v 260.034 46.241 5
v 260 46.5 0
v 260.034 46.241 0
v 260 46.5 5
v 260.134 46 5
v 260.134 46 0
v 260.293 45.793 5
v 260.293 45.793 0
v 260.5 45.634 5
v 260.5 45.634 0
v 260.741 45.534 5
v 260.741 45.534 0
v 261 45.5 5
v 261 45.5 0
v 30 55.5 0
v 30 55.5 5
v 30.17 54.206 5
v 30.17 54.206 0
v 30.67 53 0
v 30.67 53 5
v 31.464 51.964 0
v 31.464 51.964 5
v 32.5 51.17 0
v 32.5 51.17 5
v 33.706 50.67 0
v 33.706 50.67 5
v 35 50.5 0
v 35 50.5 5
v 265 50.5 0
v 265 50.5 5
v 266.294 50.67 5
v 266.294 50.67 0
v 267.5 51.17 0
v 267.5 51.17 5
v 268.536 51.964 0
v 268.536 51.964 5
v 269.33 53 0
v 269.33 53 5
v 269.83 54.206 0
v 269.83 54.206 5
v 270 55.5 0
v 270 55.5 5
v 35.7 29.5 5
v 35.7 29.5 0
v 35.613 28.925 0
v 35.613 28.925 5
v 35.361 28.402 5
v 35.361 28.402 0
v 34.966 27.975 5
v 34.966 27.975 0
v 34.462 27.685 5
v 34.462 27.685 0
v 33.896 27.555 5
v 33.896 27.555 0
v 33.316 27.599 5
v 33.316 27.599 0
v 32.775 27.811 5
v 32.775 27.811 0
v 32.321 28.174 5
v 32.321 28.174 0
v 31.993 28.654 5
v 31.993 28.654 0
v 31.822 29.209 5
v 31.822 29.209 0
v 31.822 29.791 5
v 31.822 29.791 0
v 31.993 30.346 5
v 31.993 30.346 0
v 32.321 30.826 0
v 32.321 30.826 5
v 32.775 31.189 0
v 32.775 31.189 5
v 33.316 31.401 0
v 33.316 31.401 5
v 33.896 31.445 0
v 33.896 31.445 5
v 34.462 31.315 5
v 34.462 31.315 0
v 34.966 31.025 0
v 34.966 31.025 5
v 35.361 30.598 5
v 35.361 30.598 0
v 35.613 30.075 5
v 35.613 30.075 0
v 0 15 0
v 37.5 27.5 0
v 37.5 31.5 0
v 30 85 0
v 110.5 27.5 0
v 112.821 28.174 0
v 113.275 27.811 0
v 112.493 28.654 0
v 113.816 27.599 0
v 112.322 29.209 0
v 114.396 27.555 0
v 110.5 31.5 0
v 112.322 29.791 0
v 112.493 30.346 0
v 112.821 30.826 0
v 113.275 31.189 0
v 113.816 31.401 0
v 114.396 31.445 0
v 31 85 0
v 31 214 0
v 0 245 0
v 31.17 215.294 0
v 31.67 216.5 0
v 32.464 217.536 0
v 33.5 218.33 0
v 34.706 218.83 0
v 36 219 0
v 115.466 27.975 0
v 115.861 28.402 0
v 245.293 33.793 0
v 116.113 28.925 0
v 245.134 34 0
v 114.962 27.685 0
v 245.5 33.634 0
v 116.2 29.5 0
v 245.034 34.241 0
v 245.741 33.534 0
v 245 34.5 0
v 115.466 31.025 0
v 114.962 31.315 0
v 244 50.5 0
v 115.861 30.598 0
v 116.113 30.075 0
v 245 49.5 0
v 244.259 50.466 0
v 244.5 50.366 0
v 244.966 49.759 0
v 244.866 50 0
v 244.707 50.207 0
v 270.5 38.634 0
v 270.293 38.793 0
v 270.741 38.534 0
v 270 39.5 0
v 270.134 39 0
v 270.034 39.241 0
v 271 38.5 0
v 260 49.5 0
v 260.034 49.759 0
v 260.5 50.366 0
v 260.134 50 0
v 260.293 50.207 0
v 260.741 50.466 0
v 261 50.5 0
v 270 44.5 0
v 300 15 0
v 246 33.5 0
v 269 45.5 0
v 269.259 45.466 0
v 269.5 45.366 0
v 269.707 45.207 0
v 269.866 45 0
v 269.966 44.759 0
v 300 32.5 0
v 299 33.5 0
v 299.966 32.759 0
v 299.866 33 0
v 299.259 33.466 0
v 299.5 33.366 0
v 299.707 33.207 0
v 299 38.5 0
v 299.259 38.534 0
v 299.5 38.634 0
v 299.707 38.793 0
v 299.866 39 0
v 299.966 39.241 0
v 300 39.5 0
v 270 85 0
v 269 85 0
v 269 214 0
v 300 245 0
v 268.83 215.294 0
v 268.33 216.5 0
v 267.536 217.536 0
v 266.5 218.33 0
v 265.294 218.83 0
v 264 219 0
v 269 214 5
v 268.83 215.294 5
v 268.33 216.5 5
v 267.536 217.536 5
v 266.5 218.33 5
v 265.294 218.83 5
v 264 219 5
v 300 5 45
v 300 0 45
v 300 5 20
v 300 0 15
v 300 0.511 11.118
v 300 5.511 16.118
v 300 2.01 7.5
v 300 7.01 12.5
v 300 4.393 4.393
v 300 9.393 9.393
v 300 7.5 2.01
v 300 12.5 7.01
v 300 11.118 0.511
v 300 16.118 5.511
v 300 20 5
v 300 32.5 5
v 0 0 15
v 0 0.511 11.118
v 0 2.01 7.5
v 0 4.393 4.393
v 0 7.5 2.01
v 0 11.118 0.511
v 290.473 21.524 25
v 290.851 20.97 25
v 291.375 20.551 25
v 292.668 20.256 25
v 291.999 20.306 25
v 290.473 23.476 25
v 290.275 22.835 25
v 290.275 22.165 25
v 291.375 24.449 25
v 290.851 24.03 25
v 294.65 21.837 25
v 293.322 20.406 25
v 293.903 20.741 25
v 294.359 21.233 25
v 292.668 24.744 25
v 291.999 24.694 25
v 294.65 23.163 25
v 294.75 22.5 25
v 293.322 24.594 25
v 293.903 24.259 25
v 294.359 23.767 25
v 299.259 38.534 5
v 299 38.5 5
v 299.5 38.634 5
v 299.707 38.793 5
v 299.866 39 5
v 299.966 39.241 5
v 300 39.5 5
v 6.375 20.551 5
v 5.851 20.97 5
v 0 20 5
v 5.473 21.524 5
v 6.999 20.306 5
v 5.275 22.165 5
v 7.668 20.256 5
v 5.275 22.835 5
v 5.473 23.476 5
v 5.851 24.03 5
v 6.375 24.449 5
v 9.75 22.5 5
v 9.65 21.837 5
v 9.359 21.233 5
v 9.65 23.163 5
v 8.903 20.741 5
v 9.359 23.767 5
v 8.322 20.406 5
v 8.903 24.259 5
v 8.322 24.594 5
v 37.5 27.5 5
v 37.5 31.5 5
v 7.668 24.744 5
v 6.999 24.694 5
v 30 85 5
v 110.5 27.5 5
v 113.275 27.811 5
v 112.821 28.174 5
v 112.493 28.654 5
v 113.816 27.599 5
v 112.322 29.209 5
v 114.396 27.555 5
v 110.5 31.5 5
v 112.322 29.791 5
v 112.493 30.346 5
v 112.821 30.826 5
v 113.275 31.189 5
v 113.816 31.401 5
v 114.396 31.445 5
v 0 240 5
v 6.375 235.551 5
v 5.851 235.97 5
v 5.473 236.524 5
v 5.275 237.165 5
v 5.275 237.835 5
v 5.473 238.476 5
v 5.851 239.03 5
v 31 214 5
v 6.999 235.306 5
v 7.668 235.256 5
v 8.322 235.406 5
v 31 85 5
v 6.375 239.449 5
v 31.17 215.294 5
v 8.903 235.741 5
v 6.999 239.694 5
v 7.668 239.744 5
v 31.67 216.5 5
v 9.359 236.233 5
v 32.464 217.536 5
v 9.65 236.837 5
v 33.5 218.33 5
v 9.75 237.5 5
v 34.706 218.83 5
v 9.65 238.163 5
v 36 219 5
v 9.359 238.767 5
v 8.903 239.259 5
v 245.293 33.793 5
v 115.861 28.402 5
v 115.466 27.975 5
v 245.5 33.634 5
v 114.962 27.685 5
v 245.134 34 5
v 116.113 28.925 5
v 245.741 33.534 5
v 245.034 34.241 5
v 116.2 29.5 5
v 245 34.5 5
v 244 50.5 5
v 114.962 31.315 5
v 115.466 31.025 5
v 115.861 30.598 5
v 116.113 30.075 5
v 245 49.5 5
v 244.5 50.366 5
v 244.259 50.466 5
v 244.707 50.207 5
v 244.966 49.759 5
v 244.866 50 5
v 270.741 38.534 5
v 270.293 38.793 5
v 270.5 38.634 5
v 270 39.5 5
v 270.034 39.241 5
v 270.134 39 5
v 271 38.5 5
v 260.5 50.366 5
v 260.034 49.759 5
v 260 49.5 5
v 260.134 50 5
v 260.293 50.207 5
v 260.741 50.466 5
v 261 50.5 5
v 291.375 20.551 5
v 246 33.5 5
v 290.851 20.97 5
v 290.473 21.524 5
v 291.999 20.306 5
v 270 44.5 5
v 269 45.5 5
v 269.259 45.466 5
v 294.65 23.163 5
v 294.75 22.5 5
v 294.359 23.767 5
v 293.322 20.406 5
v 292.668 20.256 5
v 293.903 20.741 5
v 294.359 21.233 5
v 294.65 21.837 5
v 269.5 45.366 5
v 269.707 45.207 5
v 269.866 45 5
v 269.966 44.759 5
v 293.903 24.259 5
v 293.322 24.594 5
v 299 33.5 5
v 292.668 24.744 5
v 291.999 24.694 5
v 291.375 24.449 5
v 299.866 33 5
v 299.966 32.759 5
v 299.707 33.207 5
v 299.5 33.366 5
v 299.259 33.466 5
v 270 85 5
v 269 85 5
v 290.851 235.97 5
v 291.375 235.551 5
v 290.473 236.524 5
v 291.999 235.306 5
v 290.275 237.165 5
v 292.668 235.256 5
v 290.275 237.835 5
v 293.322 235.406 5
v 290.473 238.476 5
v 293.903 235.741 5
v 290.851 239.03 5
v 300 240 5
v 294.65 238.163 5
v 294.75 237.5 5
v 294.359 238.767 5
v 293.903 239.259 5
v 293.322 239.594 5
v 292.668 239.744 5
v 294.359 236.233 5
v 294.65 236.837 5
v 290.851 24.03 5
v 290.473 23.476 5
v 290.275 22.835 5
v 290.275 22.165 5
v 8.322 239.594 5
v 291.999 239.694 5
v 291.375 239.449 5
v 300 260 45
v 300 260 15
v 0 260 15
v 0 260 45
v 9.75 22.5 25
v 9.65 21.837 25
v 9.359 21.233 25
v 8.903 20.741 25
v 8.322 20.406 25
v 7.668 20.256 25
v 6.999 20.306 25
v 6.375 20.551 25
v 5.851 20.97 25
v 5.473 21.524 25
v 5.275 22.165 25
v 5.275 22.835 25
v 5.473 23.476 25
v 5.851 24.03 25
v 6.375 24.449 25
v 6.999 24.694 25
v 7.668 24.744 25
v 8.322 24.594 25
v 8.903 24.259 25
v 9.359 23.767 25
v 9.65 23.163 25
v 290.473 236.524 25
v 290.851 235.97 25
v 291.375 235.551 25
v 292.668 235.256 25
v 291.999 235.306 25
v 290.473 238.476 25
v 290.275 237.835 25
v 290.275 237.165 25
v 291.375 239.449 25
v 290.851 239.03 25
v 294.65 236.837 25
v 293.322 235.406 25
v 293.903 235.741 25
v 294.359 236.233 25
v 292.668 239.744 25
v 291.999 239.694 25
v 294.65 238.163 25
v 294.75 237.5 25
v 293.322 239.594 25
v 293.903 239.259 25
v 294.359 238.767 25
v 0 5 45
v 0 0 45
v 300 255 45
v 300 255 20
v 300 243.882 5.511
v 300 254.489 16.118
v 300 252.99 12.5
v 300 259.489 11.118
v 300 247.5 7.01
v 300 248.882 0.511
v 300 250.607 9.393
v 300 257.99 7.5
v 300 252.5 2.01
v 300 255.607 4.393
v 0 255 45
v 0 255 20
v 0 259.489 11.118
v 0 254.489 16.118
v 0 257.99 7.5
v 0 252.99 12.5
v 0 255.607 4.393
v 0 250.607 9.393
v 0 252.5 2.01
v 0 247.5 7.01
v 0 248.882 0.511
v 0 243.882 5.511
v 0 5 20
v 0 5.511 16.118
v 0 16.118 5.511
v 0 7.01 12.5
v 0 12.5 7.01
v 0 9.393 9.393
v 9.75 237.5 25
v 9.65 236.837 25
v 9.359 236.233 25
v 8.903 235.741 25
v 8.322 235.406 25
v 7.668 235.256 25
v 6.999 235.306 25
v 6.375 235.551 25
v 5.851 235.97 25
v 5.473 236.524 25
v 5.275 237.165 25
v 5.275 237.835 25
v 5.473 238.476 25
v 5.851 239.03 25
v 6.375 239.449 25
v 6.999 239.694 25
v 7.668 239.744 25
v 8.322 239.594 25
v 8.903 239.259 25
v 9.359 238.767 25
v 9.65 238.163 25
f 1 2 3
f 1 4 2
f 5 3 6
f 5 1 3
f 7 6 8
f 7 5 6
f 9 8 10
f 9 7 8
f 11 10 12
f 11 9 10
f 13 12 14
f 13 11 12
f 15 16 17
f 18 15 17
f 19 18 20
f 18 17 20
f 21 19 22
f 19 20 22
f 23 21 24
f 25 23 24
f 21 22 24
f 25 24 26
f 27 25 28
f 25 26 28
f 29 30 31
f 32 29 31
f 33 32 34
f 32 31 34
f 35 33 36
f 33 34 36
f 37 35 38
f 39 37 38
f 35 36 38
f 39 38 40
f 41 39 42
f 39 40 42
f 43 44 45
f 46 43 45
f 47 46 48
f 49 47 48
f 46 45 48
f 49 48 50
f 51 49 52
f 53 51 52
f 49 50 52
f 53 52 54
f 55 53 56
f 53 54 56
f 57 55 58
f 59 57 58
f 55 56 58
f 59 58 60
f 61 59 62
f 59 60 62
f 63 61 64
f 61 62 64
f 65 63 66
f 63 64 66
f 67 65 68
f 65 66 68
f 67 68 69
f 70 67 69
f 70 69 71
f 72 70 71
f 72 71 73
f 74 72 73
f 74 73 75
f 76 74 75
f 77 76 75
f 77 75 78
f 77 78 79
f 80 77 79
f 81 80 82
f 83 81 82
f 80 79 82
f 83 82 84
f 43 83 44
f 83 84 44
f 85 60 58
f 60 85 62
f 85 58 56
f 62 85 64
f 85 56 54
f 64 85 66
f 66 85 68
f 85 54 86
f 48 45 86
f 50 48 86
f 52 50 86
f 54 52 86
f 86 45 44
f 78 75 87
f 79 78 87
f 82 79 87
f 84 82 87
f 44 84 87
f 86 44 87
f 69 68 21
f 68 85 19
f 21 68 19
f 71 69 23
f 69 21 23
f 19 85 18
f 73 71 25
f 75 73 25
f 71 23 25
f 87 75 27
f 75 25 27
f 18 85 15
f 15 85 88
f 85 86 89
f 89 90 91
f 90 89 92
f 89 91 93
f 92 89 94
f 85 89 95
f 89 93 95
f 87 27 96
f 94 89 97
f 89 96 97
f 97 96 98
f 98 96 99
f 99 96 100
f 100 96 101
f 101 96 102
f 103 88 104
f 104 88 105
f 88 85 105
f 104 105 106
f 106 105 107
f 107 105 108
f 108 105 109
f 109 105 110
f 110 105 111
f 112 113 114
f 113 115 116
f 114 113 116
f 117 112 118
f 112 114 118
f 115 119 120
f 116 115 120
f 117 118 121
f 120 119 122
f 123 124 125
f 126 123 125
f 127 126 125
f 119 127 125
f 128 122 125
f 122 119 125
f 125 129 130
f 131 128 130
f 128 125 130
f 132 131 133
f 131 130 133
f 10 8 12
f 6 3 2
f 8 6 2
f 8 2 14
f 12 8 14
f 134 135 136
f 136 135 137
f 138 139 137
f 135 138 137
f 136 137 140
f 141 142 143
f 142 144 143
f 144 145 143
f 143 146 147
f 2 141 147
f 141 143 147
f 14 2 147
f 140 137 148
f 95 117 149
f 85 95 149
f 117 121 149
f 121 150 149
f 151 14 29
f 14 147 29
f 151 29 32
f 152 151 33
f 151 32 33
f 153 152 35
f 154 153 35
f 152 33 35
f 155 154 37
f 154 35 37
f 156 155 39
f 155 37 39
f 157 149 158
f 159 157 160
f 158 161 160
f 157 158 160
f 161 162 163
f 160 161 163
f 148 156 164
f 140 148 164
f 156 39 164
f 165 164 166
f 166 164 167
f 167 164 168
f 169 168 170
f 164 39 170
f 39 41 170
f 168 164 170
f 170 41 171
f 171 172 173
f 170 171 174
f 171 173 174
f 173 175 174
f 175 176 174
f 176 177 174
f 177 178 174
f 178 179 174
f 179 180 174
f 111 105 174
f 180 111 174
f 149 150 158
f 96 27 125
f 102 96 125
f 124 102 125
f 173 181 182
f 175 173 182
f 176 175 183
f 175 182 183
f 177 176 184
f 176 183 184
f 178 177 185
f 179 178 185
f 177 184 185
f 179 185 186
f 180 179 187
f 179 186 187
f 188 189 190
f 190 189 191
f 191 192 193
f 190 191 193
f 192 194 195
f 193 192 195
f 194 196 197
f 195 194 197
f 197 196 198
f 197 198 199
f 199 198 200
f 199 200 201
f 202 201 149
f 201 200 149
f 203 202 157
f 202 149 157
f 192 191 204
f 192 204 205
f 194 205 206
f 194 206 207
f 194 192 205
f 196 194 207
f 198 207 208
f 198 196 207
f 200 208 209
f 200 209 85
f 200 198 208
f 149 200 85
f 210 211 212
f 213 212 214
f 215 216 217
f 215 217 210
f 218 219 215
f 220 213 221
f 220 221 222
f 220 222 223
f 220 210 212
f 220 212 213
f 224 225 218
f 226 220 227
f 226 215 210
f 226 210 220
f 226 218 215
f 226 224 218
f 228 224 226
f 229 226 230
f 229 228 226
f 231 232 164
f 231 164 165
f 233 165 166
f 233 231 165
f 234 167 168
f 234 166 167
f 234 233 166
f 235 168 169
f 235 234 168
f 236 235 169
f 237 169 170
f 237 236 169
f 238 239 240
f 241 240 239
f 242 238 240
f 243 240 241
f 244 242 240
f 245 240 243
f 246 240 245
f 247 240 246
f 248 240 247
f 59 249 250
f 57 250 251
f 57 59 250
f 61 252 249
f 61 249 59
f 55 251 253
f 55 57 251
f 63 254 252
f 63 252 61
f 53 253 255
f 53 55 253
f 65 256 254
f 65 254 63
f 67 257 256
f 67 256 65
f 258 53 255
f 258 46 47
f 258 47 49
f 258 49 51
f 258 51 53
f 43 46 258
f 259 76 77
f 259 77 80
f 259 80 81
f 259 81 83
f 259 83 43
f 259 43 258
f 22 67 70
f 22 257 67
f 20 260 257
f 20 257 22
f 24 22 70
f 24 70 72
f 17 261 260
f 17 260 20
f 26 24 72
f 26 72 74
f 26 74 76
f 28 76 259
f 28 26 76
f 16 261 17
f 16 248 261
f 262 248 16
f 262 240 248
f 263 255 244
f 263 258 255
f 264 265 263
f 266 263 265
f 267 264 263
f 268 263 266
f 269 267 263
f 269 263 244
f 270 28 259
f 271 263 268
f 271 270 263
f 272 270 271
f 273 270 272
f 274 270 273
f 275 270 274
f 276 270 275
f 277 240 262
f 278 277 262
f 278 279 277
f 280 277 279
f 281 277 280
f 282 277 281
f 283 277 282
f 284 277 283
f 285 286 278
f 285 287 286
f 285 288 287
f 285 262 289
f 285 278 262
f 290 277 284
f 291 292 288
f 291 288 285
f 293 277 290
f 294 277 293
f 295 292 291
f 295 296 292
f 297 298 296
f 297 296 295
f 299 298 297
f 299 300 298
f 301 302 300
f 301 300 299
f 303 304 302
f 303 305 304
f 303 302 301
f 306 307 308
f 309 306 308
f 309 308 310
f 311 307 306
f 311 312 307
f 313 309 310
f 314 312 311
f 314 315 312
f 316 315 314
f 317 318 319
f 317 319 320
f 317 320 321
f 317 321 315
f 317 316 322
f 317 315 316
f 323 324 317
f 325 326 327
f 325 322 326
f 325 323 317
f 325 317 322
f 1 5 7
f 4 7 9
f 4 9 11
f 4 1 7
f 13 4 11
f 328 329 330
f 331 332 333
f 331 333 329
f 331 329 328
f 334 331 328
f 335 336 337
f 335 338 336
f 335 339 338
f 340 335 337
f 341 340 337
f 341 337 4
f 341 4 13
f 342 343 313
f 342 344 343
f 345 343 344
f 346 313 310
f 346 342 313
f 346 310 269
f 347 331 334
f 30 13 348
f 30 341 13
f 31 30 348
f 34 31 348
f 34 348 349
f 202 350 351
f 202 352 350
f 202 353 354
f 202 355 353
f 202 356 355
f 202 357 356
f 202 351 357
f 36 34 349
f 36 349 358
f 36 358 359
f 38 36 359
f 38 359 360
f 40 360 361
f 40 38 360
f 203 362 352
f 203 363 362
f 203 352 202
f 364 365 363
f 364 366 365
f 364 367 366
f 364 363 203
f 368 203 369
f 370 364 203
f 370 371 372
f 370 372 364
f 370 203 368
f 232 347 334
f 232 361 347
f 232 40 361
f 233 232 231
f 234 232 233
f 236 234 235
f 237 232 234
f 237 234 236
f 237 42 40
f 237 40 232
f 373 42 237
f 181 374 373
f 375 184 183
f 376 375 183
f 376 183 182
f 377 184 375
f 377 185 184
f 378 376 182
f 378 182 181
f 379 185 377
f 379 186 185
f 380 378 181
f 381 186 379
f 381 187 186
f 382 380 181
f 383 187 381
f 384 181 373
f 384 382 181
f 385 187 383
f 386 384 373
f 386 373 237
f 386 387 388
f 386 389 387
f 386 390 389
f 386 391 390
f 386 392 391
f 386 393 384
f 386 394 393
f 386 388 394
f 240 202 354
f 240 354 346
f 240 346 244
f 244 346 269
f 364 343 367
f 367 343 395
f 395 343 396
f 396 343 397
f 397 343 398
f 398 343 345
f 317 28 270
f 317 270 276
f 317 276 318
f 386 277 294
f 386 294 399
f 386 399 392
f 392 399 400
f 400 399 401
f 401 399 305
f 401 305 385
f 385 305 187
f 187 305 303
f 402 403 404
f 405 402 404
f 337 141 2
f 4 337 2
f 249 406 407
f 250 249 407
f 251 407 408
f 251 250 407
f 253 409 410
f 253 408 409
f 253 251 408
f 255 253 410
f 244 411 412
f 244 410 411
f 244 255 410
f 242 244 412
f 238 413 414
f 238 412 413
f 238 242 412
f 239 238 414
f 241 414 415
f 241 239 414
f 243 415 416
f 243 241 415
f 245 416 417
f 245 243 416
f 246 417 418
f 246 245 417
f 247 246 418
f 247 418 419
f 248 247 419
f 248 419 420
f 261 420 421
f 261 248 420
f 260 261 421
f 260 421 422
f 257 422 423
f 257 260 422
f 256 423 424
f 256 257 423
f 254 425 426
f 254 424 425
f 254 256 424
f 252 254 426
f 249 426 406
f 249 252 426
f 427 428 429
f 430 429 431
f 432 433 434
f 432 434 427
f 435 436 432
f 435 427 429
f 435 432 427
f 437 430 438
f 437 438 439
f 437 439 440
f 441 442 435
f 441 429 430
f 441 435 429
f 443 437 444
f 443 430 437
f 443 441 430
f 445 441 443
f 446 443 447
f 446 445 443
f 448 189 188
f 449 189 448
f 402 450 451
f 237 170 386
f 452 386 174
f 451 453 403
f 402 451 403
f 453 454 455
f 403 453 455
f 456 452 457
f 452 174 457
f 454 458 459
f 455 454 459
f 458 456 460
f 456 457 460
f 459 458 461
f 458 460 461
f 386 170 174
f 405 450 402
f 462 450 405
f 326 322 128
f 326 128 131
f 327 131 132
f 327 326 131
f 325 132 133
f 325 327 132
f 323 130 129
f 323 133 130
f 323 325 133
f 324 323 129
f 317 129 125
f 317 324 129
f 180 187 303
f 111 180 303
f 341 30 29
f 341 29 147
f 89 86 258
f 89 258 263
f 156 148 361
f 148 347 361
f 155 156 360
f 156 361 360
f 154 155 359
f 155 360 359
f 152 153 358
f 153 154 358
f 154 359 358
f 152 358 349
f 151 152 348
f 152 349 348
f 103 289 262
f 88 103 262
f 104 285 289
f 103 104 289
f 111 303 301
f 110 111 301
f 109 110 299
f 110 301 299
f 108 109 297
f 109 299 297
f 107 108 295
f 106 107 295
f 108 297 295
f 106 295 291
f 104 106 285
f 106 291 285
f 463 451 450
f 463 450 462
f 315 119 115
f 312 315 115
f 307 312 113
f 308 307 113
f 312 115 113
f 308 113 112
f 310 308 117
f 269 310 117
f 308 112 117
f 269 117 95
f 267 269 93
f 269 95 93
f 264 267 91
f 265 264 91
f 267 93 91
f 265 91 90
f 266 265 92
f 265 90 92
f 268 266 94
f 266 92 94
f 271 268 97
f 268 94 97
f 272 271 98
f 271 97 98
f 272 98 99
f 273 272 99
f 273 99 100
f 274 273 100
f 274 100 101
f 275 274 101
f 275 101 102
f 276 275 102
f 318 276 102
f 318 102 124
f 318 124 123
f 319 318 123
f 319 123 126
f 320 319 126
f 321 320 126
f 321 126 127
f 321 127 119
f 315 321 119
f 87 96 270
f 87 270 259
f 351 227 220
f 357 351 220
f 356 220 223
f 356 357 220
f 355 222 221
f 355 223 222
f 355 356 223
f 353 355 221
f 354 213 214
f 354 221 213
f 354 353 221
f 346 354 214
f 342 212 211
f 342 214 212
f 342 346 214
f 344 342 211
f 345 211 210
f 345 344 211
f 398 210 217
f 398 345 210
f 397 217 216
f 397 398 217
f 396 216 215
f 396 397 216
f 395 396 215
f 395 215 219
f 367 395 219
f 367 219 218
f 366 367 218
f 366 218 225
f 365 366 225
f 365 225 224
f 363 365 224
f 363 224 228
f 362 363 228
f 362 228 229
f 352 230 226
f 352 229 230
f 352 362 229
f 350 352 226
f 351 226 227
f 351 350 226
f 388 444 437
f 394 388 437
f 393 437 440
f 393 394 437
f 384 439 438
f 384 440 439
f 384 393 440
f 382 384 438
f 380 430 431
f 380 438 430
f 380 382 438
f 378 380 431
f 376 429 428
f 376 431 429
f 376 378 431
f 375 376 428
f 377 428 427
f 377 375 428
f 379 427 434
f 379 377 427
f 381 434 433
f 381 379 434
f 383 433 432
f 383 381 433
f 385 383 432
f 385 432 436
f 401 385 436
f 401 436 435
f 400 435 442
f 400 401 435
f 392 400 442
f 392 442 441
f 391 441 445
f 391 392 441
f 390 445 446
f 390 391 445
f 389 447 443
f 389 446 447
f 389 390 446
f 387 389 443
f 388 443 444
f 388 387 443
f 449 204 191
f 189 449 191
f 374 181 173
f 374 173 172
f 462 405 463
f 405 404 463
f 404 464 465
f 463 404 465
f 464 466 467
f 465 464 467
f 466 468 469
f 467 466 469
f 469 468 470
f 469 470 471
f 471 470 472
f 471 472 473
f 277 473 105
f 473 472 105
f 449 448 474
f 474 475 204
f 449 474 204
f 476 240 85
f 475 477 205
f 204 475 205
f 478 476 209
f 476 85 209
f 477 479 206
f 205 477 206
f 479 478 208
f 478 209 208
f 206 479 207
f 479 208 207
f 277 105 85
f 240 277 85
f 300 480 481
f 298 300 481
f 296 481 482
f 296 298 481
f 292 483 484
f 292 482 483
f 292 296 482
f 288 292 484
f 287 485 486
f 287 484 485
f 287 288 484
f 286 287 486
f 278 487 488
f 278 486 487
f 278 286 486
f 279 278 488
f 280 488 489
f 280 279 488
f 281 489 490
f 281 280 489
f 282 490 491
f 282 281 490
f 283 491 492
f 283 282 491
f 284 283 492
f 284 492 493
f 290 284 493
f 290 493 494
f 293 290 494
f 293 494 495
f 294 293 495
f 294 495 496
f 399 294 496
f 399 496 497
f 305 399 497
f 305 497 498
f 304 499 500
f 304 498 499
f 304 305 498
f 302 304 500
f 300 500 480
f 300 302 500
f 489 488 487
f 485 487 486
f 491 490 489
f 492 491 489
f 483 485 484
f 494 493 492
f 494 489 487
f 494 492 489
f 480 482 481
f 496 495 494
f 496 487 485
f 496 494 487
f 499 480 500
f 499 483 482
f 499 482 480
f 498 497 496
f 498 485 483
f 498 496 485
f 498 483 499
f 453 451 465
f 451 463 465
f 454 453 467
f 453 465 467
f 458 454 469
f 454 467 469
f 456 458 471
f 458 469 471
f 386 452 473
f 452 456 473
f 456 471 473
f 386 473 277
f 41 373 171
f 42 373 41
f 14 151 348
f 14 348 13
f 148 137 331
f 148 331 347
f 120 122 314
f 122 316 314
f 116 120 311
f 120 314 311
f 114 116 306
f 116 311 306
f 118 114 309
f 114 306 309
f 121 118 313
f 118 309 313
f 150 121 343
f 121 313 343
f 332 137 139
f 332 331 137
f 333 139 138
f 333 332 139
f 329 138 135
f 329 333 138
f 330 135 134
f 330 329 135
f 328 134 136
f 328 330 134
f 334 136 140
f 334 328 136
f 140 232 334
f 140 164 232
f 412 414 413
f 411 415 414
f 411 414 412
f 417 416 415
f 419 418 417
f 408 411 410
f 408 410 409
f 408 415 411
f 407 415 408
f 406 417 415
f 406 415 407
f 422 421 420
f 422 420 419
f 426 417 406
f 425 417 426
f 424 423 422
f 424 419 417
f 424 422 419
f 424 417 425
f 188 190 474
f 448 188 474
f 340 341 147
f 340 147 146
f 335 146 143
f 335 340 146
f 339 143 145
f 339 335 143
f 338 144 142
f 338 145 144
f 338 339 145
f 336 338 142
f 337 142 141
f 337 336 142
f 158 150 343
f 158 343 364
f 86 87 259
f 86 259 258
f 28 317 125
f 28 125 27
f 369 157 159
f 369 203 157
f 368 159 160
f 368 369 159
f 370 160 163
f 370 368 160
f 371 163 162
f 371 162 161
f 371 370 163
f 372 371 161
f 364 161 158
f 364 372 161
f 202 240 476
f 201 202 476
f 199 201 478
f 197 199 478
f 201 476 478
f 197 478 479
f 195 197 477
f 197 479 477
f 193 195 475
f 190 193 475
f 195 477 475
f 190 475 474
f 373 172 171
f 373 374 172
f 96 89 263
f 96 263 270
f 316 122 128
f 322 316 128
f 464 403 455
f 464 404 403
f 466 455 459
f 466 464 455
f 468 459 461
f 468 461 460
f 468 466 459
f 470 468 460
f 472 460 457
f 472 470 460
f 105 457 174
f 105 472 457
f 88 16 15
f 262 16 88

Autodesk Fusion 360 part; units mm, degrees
sketch "Sketch1" plane through (0, 0, 0) normal (0, 0, 1) x (1, 0, 0)
  line L0 (0, 0) -> (300, 0)
  line L1 (300, 0) -> (300, 260)
  line L2 (300, 260) -> (0, 260)
  line L3 (0, 260) -> (0, 0)
  circle A0 centre (7.5, 22.5) radius 2.25
  circle A1 centre (292.5, 22.5) radius 2.25
  circle A2 centre (7.5, 237.5) radius 2.25
  circle A3 centre (292.5, 237.5) radius 2.25
  dimension "d1" = 300
  dimension "d2" = 260
  dimension "d3" = 4.5
  dimension "d4" = 4.5
  dimension "d5" = 4.5
  dimension "d6" = 4.5
  dimension "d7" = 22.5
  dimension "d8" = 7.5
  dimension "d9" = 22.5
  dimension "d10" = 7.5
  dimension "d11" = 7.5
  dimension "d12" = 22.5
  dimension "d13" = 22.5
  dimension "d14" = 7.5
extrude "Extrude1" add sketch "Sketch1" along normal blind 5
extrude "Extrude2" add sketch "Sketch1" along normal blind 25 contours A0
extrude "Extrude3" add sketch "Sketch1" along normal blind 25 contours A2
extrude "Extrude4" add sketch "Sketch1" along normal blind 25 contours A3
extrude "Extrude5" add sketch "Sketch1" along normal blind 25 contours A1
sketch "Sketch2" plane through (0, 0, 5) normal (0, 0, 1) x (-1, 0, 0)
  circle A0 centre (-7.5, -22.5) radius 2.25
  circle A1 centre (-7.5, -237.5) radius 2.25
  circle A2 centre (-292.5, -22.5) radius 2.25
  circle A3 centre (-292.5, -237.5) radius 2.25
  line L0 (0, -260) -> (0, 0)
  line L1 (0, 0) -> (-300, 0)
  line L2 (-300, 0) -> (-300, -260)
  line L3 (-300, -260) -> (0, -260)
  line L4 (-30, -220) -> (-270, -220)
  line L5 (-270, -220) -> (-270, -55.5)
  line L6 (-270, -50.5) -> (-30, -50.5)
  line L7 (-30, -50.5) -> (-30, -220)
  line L8 (-300, -260) -> (0, -260)
  line L9 (0, 0) -> (-300, 0)
  line L10 (0, -260) -> (0, 0)
  line L11 (-300, 0) -> (-300, -260)
  line L12 (-30, -220) -> (-270, -220)
  line L13 (-270, -220) -> (-270, -219)
  line L14 (-270, -219) -> (-30, -219)
  line L15 (-30, -219) -> (-30, -220)
  line L16 (-270, -220) -> (-269, -220)
  line L17 (-269, -220) -> (-269, -85)
  line L18 (-269, -85) -> (-270, -85)
  line L19 (-270, -85) -> (-270, -220)
  line L20 (-30, -220) -> (-31, -220)
  line L21 (-31, -220) -> (-31, -85)
  line L22 (-31, -85) -> (-30, -85)
  line L23 (-30, -85) -> (-30, -220)
  line L24 (-36, -219) -> (-36, -219)
  line L25 (-36, -219) -> (-36, -214)
  line L26 (-36, -214) -> (-31, -214)
  line L27 (-31, -214) -> (-31, -214)
  arc A4 (-36, -219) -> (-31, -214) centre (-36, -214) ccw
  line L28 (-264, -219) -> (-264, -219)
  line L29 (-264, -219) -> (-264, -214)
  line L30 (-264, -214) -> (-269, -214)
  line L31 (-269, -214) -> (-269, -214)
  arc A5 (-269, -214) -> (-264, -219) centre (-264, -214) ccw
  line L32 (-265, -50.5) -> (-265, -50.5)
  line L33 (-265, -50.5) -> (-265, -55.5)
  line L34 (-265, -55.5) -> (-270, -55.5)
  line L35 (-270, -55.5) -> (-270, -50.5)
  arc A6 (-265, -50.5) -> (-270, -55.5) centre (-265, -55.5) ccw
  line L36 (-35, -50.5) -> (-35, -50.5)
  line L37 (-35, -50.5) -> (-35, -55.5)
  line L38 (-35, -55.5) -> (-30, -55.5)
  line L39 (-30, -55.5) -> (-30, -55.5)
  arc A7 (-30, -55.5) -> (-35, -50.5) centre (-35, -55.5) ccw
  point P0 (-31, -219)
  point P1 (-269, -219)
  dimension "d25" = 240
  dimension "d26" = 169.5
  dimension "d27" = 40
  dimension "d28" = 50.5
  dimension "d29" = 30
  dimension "d30" = 30
  dimension "d31" = 1
  dimension "d32" = 135
  dimension "d33" = 1
  dimension "d34" = 135
  dimension "d35" = 1
  dimension "d36" = 5
  dimension "d37" = 5
  dimension "d38" = 5
  dimension "d39" = 5
  dimension "d40" = 5
  dimension "d41" = 5
  dimension "d42" = 5
  dimension "d43" = 5
  dimension "d44" = 5
  dimension "d45" = 5
  dimension "d46" = 5
  dimension "d47" = 5
extrude "Extrude6" cut sketch "Sketch2" against normal blind 5 contours L5 L6 L7 L14 L17 L18 L21 L22 L25 L26 L29 L30 L33 L34 L37 L38
extrude "Extrude7" cut sketch "Sketch2" against normal blind 5 contours L37 L38 A7
extrude "Extrude8" cut sketch "Sketch2" against normal blind 5 contours L33 L34 A6
extrude "Extrude9" cut sketch "Sketch2" against normal blind 5 contours L29 L30 A5
extrude "Extrude10" cut sketch "Sketch2" against normal blind 5 contours L25 L26 A4
sketch "Sketch3" plane through (0, 0, 5) normal (0, 0, 1) x (-1, 0, 0)
  arc A0 (-36, -219) -> (-31, -214) centre (-36, -214) ccw
  line L0 (-36, -219) -> (-264, -219)
  arc A1 (-269, -214) -> (-264, -219) centre (-264, -214) ccw
  line L1 (-269, -214) -> (-269, -85)
  line L2 (-269, -85) -> (-270, -85)
  line L3 (-270, -85) -> (-270, -55.5)
  arc A2 (-265, -50.5) -> (-270, -55.5) centre (-265, -55.5) ccw
  line L4 (-265, -50.5) -> (-35, -50.5)
  arc A3 (-30, -55.5) -> (-35, -50.5) centre (-35, -55.5) ccw
  line L5 (-30, -55.5) -> (-30, -85)
  line L6 (-30, -85) -> (-31, -85)
  line L7 (-31, -85) -> (-31, -214)
  line L8 (0, -260) -> (0, 0)
  line L9 (0, 0) -> (-300, 0)
  line L10 (-300, 0) -> (-300, -260)
  line L11 (-300, -260) -> (0, -260)
  circle A4 centre (-292.5, -237.5) radius 2.25
  circle A5 centre (-292.5, -22.5) radius 2.25
  circle A6 centre (-7.5, -237.5) radius 2.25
  circle A7 centre (-7.5, -22.5) radius 2.25
  line L12 (0, 0) -> (-300, 0)
  line L13 (-300, 0) -> (-300, -5)
  line L14 (-300, -5) -> (0, -5)
  line L15 (0, -5) -> (0, 0)
  line L16 (0, -260) -> (-300, -260)
  line L17 (-300, -260) -> (-300, -255)
  line L18 (-300, -255) -> (0, -255)
  line L19 (0, -255) -> (0, -260)
  dimension "d58" = 300
  dimension "d59" = 5
  dimension "d60" = 300
  dimension "d61" = 5
extrude "Extrude11" add sketch "Sketch3" along normal blind 40 contours L8 L10 L11 L16 L17 L18 L19
extrude "Extrude12" add sketch "Sketch3" along normal blind 40 contours L8 L9 L10 L12 L13 L14 L15
fillet "Fillet1" radius 15 1 edges at (150, 255, 5)
fillet "Fillet2" radius 15 1 edges at (150, 260, 0)
fillet "Fillet3" radius 15 1 edges at (150, 5, 5)
fillet "Fillet4" radius 15 1 edges at (150, 0, 0)
sketch "Sketch4" plane through (0, 0, 0) normal (0, 0, -1) x (1, 0, 0)
  line L0 (300, -15) -> (0, -15)
  line L1 (0, -15) -> (0, -245)
  line L2 (0, -245) -> (300, -245)
  line L3 (300, -245) -> (300, -15)
  arc A0 (31, -214) -> (36, -219) centre (36, -214) ccw
  line L4 (31, -214) -> (31, -85)
  line L5 (31, -85) -> (30, -85)
  line L6 (30, -85) -> (30, -55.5)
  arc A1 (35, -50.5) -> (30, -55.5) centre (35, -55.5) ccw
  line L7 (35, -50.5) -> (265, -50.5)
  arc A2 (270, -55.5) -> (265, -50.5) centre (265, -55.5) ccw
  line L8 (270, -55.5) -> (270, -85)
  line L9 (270, -85) -> (269, -85)
  line L10 (269, -85) -> (269, -214)
  arc A3 (264, -219) -> (269, -214) centre (264, -214) ccw
  line L11 (264, -219) -> (36, -219)
  line L12 (245, -50.5) -> (260, -50.5)
  line L13 (260, -50.5) -> (260, -33.5)
  line L14 (260, -33.5) -> (245, -33.5)
  line L15 (245, -33.5) -> (245, -50.5)
  line L16 (260, -33.5) -> (270, -33.5)
  line L17 (270, -33.5) -> (270, -45.5)
  line L18 (270, -45.5) -> (260, -45.5)
  line L19 (260, -45.5) -> (260, -33.5)
  line L20 (270, -33.5) -> (300, -33.5)
  line L21 (300, -33.5) -> (300, -38.5)
  line L22 (300, -38.5) -> (270, -38.5)
  line L23 (270, -38.5) -> (270, -33.5)
  dimension "d74" = 15
  dimension "d75" = 17
  dimension "d76" = 10
  dimension "d77" = 12
  dimension "d78" = 30
  dimension "d79" = 30
  dimension "d80" = 5
extrude "Extrude13" cut sketch "Sketch4" against normal blind 5 contours L7 L12 L13 L14 L15 L19
extrude "Extrude14" cut sketch "Sketch4" against normal blind 5 contours L13 L16 L17 L18 L19 L23
extrude "Extrude15" cut sketch "Sketch4" against normal blind 5 contours L3 L17 L20 L21 L22 L23
fillet "Fillet5" radius 1 1 edges at (245, 50.5, 2.5)
fillet "Fillet6" radius 1 1 edges at (245, 33.5, 2.5)
fillet "Fillet7" radius 1 1 edges at (260, 50.5, 2.5)
fillet "Fillet8" radius 1 1 edges at (260, 45.5, 2.5)
fillet "Fillet9" radius 1 1 edges at (270, 45.5, 2.5)
fillet "Fillet10" radius 1 1 edges at (270, 38.5, 2.5)
fillet "Fillet11" radius 1 1 edges at (300, 33.5, 2.5)
fillet "Fillet12" radius 1 1 edges at (300, 38.5, 2.5)
sketch "Sketch5" plane through (0, 0, 0) normal (0, 0, -1) x (1, 0, 0)
  arc A0 (300, -39.5) -> (299, -38.5) centre (299, -39.5) ccw
  line L0 (299, -38.5) -> (271, -38.5)
  arc A1 (271, -38.5) -> (270, -39.5) centre (271, -39.5) ccw
  line L1 (270, -39.5) -> (270, -44.5)
  arc A2 (269, -45.5) -> (270, -44.5) centre (269, -44.5) ccw
  line L2 (269, -45.5) -> (261, -45.5)
  arc A3 (261, -45.5) -> (260, -46.5) centre (261, -46.5) ccw
  line L3 (260, -46.5) -> (260, -49.5)
  arc A4 (260, -49.5) -> (261, -50.5) centre (261, -49.5) ccw
  line L4 (261, -50.5) -> (265, -50.5)
  arc A5 (270, -55.5) -> (265, -50.5) centre (265, -55.5) ccw
  line L5 (270, -55.5) -> (270, -85)
  line L6 (270, -85) -> (269, -85)
  line L7 (269, -85) -> (269, -214)
  arc A6 (264, -219) -> (269, -214) centre (264, -214) ccw
  line L8 (264, -219) -> (36, -219)
  arc A7 (31, -214) -> (36, -219) centre (36, -214) ccw
  line L9 (31, -214) -> (31, -85)
  line L10 (31, -85) -> (30, -85)
  line L11 (30, -85) -> (30, -55.5)
  arc A8 (35, -50.5) -> (30, -55.5) centre (35, -55.5) ccw
  line L12 (35, -50.5) -> (244, -50.5)
  arc A9 (244, -50.5) -> (245, -49.5) centre (244, -49.5) ccw
  line L13 (245, -49.5) -> (245, -34.5)
  arc A10 (246, -33.5) -> (245, -34.5) centre (246, -34.5) ccw
  line L14 (246, -33.5) -> (299, -33.5)
  arc A11 (299, -33.5) -> (300, -32.5) centre (299, -32.5) ccw
  line L15 (300, -32.5) -> (300, -15)
  line L16 (300, -15) -> (0, -15)
  line L17 (0, -15) -> (0, -245)
  line L18 (0, -245) -> (300, -245)
  line L19 (300, -245) -> (300, -39.5)
  line L20 (30, -23.5) -> (118, -23.5)
  line L21 (118, -23.5) -> (118, -35.5)
  line L22 (118, -35.5) -> (30, -35.5)
  line L23 (30, -35.5) -> (30, -23.5)
  line L24 (37.5, -27.5) -> (110.5, -27.5)
  line L25 (110.5, -27.5) -> (110.5, -31.5)
  line L26 (110.5, -31.5) -> (37.5, -31.5)
  line L27 (37.5, -31.5) -> (37.5, -27.5)
  circle A12 centre (114.25, -29.5) radius 1.95
  circle A13 centre (33.75, -29.5) radius 1.95
  dimension "d103" = 88
  dimension "d104" = 12
  dimension "d105" = 15
  dimension "d106" = 30
  dimension "d107" = 73
  dimension "d108" = 4
  dimension "d109" = 4
  dimension "d110" = 7.5
  dimension "d111" = 3.9
  dimension "d112" = 3.75
  dimension "d113" = 3.9
  dimension "d114" = 3.75
  dimension "d115" = 6
  dimension "d116" = 6
extrude "Extrude16" cut sketch "Sketch5" against normal blind 5 contours L24 L25 L26 L27
extrude "Extrude17" cut sketch "Sketch5" against normal blind 5 contours A13
extrude "Extrude18" cut sketch "Sketch5" against normal blind 5 contours A12
